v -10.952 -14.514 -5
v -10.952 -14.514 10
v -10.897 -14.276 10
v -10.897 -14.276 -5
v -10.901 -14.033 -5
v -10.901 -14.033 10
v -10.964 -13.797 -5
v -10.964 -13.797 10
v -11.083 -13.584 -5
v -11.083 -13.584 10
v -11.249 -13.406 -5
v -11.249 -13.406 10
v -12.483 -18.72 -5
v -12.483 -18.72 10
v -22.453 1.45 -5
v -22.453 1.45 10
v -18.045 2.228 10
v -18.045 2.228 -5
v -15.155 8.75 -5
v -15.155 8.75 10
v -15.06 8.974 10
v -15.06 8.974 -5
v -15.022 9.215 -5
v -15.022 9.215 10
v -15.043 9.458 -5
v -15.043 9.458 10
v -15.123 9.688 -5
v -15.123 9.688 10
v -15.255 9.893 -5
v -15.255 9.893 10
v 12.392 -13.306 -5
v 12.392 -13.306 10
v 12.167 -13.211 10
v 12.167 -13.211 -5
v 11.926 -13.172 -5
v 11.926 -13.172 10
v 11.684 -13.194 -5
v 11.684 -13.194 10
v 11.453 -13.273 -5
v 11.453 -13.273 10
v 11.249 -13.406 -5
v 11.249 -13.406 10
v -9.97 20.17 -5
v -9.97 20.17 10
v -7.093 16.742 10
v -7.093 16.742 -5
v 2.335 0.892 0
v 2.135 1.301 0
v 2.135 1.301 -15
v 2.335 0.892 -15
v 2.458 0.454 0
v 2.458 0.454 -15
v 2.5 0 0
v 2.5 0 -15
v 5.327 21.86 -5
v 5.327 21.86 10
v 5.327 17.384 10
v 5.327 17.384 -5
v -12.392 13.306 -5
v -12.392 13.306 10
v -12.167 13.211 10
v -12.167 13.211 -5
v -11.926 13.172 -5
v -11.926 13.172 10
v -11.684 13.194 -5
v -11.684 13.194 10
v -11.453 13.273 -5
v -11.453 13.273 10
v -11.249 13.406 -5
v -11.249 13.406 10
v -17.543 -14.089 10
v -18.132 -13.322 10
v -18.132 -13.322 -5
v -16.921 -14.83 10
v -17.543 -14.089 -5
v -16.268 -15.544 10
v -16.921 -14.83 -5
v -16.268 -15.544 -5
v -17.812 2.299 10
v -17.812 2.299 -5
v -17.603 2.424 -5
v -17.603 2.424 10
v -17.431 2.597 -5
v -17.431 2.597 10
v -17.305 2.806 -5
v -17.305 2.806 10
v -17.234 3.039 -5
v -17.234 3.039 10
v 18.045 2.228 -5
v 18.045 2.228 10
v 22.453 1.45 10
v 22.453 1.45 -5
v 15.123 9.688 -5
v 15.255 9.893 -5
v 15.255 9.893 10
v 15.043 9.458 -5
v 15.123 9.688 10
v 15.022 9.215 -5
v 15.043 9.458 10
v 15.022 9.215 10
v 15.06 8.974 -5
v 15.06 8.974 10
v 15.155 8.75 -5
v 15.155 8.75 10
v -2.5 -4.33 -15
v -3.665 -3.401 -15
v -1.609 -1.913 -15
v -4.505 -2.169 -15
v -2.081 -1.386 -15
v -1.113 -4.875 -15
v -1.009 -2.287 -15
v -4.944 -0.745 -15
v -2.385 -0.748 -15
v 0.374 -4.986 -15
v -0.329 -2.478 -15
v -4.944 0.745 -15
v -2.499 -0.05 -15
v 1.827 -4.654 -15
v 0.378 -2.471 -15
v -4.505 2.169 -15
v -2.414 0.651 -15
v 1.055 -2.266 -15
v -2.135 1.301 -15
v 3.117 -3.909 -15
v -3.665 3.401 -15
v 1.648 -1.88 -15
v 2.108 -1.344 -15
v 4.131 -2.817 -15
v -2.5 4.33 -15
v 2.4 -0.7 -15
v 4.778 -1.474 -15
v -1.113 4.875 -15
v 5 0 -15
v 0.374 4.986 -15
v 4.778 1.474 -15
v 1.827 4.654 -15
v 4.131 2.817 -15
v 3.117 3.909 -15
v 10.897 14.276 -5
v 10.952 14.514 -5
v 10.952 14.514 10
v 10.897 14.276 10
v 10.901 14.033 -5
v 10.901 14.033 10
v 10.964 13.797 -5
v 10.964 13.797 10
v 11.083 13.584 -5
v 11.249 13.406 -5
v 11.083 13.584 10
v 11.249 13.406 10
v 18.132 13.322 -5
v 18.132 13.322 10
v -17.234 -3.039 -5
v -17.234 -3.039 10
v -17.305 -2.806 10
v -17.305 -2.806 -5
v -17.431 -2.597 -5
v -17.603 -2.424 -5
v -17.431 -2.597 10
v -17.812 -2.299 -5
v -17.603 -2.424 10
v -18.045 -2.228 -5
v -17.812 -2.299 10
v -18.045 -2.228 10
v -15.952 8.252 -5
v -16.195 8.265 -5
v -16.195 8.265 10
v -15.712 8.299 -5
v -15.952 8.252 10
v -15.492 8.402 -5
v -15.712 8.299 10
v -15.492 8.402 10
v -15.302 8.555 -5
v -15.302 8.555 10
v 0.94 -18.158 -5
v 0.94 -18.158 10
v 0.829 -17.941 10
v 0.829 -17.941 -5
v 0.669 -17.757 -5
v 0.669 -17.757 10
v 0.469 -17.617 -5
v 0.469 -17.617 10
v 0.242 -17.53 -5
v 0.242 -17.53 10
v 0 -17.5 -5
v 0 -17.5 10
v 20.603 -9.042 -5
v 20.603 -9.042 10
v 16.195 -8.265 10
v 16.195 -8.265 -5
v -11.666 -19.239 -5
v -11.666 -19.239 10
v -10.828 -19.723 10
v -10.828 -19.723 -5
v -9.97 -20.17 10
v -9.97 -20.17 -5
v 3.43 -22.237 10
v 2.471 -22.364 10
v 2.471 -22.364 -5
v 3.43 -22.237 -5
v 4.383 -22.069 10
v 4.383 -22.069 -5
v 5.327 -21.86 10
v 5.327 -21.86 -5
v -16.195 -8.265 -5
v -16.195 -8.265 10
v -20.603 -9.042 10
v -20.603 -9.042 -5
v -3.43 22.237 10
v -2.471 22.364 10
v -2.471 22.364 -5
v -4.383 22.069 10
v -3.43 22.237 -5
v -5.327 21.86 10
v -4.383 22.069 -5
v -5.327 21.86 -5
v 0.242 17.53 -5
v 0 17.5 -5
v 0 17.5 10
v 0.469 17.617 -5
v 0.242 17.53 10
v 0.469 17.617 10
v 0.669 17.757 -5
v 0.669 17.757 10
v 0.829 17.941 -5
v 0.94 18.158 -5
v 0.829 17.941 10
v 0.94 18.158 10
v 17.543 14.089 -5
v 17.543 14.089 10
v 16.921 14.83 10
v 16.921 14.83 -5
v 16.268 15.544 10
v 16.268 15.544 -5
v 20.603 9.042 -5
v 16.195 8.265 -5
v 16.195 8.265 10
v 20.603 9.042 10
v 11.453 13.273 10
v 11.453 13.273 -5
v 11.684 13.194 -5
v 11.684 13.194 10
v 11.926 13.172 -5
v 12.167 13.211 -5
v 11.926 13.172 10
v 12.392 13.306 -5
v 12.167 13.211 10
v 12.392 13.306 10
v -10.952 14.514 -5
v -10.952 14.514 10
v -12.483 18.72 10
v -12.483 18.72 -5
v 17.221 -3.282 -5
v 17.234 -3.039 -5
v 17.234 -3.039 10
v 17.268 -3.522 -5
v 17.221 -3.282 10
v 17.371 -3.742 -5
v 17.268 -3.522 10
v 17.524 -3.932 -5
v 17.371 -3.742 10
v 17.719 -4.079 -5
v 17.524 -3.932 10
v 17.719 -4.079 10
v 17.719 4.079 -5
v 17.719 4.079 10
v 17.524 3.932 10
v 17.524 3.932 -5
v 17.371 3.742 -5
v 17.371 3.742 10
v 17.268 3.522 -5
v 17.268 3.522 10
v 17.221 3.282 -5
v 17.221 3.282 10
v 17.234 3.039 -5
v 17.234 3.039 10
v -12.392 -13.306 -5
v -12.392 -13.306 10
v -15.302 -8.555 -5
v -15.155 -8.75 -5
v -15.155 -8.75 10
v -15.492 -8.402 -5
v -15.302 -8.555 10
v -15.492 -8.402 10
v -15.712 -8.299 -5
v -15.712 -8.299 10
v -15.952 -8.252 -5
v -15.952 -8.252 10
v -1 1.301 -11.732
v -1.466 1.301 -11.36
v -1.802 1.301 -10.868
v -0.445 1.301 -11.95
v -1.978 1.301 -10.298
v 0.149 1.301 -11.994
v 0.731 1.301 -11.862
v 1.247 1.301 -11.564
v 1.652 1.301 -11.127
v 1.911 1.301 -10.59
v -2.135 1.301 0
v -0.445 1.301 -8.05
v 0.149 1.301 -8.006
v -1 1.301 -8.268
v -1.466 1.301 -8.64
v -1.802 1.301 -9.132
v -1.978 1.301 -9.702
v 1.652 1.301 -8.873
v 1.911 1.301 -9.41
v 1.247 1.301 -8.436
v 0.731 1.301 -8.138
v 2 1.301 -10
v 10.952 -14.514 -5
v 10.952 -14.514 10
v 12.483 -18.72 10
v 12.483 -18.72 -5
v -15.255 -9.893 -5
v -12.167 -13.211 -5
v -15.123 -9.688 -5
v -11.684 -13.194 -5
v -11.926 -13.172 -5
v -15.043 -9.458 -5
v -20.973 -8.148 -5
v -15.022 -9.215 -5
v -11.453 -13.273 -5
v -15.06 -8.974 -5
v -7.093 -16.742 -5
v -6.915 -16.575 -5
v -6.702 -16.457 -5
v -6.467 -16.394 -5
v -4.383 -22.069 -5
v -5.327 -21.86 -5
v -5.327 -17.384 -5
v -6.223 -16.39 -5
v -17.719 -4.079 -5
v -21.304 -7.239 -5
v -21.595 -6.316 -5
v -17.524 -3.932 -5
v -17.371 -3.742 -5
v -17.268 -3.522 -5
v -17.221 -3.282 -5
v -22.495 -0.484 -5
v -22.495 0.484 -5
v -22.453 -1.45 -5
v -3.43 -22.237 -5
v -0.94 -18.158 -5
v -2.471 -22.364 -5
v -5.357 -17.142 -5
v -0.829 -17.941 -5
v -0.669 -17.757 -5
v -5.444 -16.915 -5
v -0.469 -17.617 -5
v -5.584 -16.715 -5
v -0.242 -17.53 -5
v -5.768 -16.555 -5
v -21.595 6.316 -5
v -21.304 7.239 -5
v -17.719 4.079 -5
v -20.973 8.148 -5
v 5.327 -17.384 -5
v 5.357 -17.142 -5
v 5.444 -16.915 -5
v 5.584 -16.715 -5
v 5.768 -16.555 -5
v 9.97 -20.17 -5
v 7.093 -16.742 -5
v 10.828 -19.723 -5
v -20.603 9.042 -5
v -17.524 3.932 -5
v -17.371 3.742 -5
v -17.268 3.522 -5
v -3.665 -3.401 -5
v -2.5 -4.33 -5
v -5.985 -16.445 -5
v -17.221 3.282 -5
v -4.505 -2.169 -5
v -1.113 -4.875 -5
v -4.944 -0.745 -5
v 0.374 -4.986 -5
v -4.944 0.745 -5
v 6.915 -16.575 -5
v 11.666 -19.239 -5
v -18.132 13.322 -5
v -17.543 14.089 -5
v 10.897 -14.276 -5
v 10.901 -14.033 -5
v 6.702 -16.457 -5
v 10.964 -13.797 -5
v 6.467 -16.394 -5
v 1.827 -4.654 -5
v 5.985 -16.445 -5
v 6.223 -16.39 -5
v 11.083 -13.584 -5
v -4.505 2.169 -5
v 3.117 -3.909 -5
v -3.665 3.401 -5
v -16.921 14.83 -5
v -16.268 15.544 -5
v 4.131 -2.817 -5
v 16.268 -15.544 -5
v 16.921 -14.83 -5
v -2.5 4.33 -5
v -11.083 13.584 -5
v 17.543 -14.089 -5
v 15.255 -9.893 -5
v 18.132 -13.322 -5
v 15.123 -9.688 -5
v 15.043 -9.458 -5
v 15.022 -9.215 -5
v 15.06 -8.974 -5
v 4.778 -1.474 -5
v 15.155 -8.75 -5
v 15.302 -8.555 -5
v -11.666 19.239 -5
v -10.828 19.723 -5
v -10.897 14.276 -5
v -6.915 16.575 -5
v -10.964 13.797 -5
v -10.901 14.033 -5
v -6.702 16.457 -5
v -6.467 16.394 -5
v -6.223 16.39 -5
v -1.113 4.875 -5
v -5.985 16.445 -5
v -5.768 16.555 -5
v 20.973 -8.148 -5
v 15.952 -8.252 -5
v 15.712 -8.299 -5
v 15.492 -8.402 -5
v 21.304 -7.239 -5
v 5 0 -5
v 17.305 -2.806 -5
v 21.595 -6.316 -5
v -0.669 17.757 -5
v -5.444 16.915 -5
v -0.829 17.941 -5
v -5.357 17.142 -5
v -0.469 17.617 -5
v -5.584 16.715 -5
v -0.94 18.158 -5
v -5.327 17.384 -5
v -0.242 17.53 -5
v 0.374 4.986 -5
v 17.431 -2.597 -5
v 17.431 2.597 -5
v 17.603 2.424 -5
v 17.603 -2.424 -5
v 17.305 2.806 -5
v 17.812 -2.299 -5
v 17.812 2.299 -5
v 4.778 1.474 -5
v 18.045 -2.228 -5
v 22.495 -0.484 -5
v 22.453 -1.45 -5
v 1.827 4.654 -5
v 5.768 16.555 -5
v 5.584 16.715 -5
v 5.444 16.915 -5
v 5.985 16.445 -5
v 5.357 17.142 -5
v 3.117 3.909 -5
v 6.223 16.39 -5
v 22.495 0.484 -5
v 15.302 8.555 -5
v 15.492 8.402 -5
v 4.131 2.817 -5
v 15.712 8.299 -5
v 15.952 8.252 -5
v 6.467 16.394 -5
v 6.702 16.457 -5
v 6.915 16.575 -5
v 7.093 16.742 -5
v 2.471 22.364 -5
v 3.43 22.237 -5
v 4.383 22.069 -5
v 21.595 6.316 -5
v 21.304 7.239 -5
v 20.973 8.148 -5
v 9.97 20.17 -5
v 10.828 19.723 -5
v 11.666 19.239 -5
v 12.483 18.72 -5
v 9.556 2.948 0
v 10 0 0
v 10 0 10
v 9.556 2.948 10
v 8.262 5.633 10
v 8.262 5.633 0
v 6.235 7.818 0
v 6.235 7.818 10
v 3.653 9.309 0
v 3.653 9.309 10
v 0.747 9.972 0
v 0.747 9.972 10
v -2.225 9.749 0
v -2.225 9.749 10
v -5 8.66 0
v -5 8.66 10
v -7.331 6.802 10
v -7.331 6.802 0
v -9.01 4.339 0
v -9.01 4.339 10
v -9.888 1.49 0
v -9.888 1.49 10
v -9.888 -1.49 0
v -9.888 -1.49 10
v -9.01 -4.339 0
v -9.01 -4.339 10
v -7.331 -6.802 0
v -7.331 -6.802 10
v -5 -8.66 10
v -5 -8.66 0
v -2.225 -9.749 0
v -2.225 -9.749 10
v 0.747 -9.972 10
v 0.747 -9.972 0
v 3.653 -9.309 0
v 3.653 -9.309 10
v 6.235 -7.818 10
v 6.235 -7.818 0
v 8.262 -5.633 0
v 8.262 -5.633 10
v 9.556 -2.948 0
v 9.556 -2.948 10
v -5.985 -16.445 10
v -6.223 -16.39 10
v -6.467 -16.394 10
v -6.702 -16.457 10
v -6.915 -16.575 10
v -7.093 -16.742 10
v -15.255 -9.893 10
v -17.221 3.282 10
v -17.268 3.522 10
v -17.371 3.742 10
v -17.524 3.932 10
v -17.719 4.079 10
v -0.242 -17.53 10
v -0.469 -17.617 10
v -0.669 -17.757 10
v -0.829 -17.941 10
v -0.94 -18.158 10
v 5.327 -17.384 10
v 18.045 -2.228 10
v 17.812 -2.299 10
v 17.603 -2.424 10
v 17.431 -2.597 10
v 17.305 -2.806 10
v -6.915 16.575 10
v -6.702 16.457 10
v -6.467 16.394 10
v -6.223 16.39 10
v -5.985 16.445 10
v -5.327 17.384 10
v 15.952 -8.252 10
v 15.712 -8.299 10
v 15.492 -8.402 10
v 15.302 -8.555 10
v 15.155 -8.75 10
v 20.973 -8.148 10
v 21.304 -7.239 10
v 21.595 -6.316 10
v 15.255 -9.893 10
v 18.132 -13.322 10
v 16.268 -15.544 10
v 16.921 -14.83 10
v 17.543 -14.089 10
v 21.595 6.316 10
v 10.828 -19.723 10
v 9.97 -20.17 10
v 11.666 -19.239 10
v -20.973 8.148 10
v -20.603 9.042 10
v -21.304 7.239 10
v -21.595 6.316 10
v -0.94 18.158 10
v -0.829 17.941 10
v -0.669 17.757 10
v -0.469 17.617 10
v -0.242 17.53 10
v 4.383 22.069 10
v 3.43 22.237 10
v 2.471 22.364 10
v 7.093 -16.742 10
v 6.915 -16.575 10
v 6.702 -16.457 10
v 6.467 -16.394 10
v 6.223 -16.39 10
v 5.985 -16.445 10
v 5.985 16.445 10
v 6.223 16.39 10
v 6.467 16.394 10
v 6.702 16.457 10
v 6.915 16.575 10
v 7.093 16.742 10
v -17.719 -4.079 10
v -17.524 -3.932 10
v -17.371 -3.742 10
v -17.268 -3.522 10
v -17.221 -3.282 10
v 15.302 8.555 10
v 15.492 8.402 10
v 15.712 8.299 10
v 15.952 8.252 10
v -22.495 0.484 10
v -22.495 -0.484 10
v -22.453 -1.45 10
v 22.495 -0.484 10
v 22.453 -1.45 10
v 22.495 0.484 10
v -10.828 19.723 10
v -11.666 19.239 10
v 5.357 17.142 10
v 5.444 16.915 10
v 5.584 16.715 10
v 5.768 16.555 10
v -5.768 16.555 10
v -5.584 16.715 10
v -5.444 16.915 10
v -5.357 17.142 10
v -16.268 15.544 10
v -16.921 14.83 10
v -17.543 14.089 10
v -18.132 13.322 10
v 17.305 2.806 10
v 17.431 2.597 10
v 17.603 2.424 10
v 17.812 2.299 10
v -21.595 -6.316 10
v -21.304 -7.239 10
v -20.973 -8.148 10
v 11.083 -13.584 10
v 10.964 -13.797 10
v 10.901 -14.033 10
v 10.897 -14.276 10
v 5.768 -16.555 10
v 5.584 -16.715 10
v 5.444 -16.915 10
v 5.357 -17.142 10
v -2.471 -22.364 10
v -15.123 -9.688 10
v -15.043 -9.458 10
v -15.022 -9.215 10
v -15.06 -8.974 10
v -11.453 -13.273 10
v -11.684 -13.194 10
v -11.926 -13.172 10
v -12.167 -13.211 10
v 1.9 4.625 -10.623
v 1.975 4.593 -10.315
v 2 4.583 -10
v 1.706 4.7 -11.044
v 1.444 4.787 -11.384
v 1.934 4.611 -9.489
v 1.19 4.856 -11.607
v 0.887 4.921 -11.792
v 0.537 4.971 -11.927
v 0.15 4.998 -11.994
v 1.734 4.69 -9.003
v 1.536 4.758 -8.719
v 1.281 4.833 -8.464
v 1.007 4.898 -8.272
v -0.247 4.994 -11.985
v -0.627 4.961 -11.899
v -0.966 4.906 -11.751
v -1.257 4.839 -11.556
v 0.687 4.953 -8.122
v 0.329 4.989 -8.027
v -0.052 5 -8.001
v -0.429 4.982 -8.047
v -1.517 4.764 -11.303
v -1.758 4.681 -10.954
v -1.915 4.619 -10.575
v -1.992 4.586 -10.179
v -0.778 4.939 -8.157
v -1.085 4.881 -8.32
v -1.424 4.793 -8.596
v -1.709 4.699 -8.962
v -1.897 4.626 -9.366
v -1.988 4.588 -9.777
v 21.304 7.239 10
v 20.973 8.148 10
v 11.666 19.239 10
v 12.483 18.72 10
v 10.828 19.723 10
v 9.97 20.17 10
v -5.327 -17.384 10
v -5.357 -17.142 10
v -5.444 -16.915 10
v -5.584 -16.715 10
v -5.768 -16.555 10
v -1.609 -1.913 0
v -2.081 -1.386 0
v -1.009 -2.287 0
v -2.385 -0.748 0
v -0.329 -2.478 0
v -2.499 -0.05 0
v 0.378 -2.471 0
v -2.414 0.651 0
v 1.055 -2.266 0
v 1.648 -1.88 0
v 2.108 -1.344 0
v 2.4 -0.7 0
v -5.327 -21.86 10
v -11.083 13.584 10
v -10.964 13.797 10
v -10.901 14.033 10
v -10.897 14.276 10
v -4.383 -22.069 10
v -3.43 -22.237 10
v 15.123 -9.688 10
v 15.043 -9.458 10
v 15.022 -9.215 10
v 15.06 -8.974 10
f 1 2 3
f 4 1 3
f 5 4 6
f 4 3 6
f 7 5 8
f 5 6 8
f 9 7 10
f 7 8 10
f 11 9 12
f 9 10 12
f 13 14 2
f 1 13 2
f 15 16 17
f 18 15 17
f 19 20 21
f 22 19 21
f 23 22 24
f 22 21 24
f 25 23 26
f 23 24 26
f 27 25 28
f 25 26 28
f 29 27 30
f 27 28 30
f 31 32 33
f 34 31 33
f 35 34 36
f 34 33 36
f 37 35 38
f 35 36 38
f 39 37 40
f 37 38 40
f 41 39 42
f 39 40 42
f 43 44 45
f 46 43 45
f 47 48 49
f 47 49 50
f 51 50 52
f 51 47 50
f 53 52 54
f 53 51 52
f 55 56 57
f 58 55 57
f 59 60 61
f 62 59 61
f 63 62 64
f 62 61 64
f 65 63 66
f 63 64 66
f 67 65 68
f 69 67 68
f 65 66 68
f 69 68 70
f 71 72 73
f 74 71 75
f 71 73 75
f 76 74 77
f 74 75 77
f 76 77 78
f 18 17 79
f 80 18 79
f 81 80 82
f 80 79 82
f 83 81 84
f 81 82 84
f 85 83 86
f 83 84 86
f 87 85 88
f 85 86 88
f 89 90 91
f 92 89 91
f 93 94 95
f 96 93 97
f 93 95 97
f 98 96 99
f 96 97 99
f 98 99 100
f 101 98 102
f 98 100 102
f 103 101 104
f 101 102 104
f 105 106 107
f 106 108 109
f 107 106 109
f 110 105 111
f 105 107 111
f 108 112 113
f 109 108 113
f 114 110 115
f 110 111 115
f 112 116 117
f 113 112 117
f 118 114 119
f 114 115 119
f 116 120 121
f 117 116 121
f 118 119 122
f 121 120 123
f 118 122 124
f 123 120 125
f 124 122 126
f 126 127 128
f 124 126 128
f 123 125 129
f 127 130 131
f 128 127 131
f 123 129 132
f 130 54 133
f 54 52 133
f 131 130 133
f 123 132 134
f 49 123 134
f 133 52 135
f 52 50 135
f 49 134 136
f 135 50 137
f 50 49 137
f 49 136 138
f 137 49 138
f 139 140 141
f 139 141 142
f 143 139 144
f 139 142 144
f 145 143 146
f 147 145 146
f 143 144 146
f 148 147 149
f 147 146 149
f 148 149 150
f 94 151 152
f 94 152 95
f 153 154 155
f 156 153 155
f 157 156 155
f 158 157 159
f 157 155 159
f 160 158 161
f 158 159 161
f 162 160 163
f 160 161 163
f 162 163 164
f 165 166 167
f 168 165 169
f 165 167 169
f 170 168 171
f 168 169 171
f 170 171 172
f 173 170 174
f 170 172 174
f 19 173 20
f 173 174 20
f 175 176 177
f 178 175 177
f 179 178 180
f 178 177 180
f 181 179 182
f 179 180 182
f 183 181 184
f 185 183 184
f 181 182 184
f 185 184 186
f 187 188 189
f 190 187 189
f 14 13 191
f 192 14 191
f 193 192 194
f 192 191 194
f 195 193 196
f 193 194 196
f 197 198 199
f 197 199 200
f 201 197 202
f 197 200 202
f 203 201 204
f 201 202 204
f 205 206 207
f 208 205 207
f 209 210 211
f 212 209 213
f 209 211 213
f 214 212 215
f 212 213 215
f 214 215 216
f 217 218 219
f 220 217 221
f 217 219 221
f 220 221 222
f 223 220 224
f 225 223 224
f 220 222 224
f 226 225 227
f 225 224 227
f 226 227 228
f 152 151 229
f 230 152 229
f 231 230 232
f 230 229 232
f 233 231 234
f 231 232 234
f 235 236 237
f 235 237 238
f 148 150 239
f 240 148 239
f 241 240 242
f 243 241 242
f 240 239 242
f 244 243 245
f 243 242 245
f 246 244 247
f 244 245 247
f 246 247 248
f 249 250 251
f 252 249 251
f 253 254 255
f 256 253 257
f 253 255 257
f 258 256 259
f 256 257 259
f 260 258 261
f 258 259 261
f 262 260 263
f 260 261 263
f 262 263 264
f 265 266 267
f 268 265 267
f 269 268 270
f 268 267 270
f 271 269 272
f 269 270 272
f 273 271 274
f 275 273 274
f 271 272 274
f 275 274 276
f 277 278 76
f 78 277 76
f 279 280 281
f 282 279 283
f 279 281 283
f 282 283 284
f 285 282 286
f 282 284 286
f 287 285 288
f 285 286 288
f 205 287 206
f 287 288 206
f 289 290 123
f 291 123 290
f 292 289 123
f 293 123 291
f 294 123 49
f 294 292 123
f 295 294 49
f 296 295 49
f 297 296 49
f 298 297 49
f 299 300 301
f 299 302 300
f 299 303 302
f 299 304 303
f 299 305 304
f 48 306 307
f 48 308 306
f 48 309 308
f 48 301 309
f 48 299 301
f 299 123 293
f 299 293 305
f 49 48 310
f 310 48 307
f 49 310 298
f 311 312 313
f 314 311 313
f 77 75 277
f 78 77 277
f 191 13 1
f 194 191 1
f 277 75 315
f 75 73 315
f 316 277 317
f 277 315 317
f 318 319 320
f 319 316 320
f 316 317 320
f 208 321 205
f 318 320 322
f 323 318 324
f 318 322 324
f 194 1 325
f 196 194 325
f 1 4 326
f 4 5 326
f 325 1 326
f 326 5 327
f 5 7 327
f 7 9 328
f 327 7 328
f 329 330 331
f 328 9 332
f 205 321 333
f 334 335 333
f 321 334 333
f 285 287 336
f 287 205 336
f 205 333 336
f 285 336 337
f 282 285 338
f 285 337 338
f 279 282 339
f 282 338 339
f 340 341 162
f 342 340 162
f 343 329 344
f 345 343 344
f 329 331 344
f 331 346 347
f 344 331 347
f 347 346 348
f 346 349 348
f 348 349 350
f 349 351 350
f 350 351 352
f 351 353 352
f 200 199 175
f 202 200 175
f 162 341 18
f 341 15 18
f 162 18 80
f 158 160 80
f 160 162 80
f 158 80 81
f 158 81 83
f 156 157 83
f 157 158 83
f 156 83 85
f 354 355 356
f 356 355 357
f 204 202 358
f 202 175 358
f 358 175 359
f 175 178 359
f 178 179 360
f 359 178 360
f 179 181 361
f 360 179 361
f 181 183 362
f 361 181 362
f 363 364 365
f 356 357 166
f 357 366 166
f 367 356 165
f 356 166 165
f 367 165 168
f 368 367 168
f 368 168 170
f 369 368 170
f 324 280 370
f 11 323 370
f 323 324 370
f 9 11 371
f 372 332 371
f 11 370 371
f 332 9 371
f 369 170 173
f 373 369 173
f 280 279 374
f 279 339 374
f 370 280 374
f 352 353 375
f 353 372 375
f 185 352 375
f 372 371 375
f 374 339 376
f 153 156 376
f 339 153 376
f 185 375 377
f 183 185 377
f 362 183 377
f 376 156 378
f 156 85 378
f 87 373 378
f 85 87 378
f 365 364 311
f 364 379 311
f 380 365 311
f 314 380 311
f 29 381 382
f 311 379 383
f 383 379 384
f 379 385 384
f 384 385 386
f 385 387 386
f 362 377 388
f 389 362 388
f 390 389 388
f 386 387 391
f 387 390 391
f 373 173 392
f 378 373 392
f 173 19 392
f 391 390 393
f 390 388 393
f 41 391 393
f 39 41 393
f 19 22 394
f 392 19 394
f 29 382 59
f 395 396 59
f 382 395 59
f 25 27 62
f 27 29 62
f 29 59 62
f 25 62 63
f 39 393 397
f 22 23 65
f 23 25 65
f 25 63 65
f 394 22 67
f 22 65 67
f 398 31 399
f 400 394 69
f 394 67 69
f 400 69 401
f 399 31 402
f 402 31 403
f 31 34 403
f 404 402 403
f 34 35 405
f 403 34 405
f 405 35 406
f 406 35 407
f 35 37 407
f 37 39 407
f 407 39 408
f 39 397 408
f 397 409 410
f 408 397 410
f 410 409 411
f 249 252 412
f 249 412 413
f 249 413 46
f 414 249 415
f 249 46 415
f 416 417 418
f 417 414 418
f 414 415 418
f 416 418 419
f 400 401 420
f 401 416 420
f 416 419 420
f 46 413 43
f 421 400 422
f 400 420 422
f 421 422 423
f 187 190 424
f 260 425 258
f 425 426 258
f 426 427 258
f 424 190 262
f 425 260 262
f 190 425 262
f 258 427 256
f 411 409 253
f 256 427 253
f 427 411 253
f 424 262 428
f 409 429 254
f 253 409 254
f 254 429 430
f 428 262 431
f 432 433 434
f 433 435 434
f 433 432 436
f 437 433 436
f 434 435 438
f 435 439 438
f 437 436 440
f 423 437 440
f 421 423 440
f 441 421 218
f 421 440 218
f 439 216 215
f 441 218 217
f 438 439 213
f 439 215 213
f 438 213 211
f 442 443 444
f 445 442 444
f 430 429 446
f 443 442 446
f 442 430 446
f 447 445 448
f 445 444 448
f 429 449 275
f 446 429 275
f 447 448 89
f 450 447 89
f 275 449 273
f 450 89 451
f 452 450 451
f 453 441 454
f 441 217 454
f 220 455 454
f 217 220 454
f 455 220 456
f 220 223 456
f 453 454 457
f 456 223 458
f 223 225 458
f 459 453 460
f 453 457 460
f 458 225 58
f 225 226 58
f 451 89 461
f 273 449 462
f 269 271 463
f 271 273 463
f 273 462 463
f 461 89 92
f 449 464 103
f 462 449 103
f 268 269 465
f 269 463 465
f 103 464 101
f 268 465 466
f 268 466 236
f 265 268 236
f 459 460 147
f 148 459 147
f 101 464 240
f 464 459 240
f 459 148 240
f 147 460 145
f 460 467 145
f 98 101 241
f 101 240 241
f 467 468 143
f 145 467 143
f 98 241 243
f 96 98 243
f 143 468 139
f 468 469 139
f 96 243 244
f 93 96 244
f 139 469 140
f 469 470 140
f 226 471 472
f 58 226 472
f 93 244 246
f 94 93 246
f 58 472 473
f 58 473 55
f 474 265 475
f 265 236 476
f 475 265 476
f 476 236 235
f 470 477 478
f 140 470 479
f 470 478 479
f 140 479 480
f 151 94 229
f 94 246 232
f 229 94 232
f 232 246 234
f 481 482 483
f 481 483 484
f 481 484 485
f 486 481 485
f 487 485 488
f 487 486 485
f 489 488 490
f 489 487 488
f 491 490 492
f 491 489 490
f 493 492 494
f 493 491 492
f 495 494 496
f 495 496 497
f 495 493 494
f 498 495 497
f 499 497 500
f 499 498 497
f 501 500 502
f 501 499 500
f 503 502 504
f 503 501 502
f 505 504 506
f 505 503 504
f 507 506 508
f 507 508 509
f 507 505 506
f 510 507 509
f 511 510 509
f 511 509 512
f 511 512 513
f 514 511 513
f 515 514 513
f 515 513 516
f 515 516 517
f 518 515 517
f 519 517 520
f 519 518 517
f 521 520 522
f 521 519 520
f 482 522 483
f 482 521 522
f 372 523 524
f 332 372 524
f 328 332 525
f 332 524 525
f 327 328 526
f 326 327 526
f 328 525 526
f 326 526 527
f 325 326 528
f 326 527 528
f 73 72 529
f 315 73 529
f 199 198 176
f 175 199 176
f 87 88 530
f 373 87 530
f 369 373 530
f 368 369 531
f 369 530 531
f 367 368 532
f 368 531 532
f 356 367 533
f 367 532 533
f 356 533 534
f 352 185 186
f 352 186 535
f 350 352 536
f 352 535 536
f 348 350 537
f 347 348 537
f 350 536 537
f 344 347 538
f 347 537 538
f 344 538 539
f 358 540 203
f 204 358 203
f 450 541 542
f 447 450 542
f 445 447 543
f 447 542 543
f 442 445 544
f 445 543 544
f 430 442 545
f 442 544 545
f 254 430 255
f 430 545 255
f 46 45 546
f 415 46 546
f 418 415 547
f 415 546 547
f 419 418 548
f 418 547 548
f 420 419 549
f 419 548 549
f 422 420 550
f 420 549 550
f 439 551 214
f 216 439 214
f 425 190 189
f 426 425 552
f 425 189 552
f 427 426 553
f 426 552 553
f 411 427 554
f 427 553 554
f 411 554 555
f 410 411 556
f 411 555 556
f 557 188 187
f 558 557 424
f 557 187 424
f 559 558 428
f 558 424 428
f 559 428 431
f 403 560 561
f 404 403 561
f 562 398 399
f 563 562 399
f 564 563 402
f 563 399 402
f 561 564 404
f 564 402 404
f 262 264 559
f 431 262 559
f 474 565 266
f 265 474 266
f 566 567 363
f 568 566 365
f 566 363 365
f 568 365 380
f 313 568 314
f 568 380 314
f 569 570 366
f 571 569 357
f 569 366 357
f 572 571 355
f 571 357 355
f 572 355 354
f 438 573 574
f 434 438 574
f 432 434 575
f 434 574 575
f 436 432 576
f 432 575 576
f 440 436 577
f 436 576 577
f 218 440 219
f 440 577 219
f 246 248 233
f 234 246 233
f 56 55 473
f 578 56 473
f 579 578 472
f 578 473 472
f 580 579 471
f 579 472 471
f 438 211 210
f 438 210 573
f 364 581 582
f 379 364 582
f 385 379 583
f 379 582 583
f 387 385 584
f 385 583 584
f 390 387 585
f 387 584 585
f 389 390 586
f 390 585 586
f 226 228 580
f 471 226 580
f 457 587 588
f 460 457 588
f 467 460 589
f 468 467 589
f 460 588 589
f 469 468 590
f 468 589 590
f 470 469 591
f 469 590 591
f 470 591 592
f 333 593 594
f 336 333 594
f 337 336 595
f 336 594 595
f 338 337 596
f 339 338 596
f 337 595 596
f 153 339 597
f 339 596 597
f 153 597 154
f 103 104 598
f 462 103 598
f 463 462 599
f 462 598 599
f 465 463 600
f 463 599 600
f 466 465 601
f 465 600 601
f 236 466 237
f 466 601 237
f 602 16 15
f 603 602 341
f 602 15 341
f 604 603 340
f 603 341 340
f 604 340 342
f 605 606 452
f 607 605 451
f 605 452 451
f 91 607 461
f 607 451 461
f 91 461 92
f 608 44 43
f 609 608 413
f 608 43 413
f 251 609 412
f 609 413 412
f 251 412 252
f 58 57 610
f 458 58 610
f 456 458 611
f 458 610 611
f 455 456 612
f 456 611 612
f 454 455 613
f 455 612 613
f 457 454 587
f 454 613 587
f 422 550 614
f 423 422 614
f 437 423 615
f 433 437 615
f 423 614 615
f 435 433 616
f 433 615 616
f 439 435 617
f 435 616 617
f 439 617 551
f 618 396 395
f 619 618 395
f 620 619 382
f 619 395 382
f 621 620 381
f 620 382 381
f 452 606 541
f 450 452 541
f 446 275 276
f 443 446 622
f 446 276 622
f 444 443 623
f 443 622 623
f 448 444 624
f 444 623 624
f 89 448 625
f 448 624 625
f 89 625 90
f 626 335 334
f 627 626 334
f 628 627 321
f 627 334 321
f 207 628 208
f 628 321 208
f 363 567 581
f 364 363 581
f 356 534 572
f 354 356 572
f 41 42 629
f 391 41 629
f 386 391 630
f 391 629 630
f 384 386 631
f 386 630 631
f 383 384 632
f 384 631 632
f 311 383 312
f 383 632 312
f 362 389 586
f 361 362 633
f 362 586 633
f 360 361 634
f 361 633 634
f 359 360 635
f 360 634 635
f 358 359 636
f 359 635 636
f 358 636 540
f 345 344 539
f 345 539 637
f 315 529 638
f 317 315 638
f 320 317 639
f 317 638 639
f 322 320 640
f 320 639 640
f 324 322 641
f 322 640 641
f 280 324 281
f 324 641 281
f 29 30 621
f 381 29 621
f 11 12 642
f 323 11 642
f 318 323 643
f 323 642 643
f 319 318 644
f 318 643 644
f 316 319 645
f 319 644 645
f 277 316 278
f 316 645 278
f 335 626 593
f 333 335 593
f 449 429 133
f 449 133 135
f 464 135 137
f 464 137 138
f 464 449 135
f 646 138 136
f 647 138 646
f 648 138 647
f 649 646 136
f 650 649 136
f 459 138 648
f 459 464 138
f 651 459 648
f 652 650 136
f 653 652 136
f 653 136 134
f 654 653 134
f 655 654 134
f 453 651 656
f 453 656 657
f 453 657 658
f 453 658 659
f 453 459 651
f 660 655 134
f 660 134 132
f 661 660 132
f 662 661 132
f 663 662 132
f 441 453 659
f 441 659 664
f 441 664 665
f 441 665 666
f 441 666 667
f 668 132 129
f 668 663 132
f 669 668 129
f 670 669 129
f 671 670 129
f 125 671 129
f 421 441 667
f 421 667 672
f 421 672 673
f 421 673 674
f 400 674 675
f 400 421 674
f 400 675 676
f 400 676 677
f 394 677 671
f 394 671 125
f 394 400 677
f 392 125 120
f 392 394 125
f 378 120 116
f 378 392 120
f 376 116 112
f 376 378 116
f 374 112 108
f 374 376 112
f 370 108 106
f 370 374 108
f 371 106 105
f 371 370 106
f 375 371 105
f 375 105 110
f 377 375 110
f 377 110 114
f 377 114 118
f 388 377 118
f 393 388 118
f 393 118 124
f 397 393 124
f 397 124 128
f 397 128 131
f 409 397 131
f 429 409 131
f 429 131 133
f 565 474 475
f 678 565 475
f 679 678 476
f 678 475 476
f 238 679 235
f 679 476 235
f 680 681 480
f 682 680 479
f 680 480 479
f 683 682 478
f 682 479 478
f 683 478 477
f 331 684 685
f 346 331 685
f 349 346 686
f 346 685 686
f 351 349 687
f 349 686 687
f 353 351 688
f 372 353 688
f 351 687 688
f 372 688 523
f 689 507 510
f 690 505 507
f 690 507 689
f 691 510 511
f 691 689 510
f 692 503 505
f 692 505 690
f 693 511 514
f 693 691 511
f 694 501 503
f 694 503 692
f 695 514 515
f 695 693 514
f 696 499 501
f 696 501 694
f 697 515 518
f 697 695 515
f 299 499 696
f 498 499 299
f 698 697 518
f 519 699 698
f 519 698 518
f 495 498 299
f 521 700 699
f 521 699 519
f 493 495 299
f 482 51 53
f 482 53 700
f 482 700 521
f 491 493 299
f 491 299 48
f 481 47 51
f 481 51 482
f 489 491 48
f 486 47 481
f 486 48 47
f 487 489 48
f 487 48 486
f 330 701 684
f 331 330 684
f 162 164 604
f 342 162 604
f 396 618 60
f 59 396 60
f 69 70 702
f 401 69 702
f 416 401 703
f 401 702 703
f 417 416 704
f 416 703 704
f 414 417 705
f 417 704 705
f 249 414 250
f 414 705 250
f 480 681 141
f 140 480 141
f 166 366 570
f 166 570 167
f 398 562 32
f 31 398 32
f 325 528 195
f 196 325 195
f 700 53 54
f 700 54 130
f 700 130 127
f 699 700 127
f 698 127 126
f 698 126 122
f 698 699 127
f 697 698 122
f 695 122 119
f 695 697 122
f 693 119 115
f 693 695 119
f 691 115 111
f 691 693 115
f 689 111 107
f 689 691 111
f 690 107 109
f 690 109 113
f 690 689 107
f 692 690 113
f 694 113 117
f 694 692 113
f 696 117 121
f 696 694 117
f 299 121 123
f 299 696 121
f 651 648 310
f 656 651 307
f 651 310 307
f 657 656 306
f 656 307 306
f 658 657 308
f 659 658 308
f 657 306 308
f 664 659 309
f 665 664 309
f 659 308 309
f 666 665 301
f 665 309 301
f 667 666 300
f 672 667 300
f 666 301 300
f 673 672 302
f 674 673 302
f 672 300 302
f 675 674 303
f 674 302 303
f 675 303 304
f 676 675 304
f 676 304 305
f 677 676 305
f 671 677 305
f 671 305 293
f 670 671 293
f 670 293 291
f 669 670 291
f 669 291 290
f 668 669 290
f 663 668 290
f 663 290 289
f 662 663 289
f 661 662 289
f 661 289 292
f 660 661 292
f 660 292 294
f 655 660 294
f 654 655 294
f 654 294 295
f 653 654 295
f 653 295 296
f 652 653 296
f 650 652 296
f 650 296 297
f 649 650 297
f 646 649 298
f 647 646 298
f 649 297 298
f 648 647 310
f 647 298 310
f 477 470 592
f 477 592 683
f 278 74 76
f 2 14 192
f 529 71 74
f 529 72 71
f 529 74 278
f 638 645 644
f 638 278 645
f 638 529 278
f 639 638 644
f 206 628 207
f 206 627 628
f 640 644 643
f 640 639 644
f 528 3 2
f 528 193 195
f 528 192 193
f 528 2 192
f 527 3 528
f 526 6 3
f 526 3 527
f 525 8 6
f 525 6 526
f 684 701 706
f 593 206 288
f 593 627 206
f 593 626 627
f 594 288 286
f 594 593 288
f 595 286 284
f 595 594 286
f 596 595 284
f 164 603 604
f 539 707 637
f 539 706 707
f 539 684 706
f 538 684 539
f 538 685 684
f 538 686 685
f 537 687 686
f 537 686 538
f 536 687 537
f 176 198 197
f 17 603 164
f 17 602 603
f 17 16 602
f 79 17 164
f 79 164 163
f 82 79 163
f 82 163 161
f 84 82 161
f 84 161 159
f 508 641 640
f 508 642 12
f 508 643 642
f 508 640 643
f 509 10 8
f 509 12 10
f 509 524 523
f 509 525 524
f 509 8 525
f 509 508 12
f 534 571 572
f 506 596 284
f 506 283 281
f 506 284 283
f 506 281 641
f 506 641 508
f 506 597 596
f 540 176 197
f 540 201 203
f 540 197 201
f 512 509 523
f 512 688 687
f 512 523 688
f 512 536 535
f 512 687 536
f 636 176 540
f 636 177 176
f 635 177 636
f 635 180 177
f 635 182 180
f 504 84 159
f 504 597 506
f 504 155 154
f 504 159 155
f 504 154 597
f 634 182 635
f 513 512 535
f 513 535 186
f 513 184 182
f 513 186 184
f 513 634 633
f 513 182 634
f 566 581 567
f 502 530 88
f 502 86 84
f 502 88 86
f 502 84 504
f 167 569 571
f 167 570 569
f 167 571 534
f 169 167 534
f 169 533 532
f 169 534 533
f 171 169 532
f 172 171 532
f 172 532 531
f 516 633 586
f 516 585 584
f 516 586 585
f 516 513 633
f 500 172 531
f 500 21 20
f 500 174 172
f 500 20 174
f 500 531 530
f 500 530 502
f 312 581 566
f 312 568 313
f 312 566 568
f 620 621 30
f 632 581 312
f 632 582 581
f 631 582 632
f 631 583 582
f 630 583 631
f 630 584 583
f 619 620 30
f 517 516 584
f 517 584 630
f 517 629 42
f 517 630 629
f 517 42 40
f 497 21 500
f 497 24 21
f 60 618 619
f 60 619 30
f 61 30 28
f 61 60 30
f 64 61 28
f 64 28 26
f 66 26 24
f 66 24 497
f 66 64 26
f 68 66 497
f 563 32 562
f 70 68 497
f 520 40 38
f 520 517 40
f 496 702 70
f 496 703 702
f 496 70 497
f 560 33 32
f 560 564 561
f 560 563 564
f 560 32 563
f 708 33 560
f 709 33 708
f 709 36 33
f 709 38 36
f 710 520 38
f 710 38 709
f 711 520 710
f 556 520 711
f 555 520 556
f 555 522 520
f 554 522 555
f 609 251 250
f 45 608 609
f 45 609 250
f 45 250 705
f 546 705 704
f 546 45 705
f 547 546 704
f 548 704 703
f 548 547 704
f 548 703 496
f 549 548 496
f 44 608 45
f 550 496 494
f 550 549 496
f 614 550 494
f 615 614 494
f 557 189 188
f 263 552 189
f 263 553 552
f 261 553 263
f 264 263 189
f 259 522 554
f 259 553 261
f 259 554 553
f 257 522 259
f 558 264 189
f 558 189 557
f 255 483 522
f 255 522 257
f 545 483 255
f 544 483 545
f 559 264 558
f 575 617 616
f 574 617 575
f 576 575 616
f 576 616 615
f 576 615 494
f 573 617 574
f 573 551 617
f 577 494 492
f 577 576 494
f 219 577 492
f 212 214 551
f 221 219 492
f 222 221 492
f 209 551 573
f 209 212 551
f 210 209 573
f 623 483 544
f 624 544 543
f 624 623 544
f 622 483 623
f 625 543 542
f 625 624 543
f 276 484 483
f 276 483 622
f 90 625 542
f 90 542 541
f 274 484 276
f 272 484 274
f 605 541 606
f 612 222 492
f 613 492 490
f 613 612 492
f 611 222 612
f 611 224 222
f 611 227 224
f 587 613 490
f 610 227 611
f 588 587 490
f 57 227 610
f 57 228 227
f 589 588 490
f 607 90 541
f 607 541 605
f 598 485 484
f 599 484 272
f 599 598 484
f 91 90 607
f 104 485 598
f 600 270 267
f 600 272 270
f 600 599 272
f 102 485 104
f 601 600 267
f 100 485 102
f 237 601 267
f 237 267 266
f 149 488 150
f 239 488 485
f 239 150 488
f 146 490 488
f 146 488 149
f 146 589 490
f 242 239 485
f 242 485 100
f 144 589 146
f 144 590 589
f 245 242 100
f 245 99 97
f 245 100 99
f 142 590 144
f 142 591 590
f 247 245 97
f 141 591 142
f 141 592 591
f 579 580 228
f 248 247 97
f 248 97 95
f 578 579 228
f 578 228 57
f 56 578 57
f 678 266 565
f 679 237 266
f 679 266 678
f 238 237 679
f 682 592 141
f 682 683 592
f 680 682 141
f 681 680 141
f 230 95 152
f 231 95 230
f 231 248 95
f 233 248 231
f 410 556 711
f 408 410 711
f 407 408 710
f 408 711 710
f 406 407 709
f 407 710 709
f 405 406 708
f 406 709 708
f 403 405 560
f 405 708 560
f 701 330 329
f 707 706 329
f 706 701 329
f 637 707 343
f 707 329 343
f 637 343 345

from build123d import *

# Parameters (mm, degrees)
F0_R            = 10
F0_R_2          = 5
F1_DEPTH        = 5
F2_DEPTH        = 15
F3_R            = 2
F4_DEPTH        = 8.6998377653
F0_R_3          = 22.5
F0_R_4          = 17.5
F5_DEPTH        = 5
F6_DEPTH        = 10
F8_DEPTH        = 25.0010001
F8_COPIES_COUNT = 18


# Not quite as in the source:
# - a feature of the source that left no trace in its solid (it failed there, or was rolled back) is left out
# - a pattern or mirror of a feature is missing from the dataset's text; its kind, count and spacing are read off the source's solid


with BuildPart() as f1:
    # F0 (on Top) → F1 (new body)
    with BuildSketch(Plane.XY):
        Circle(F0_R)
        Circle(F0_R_2, mode=Mode.SUBTRACT)
    extrude(amount=-F1_DEPTH)

    # F0 (on Top) → F2 (join)
    with BuildSketch(Plane.XY):
        Circle(F0_R_2)
        with BuildLine():
            ThreePointArc((2.1347076706, 1.3011622347), (2.4069450738, 0.6757332401), (2.5, 0))
            ThreePointArc((2.5, 0), (-0.6757332401, -2.4069450738), (-2.1347076706, 1.3011622347))
            ThreePointArc((-2.1347076706, 1.3011622347), (0, 2.5), (2.1347076706, 1.3011622347))
        make_face(mode=Mode.SUBTRACT)
        with BuildLine():
            Line((-2.1347076706, 1.3011622347), (2.1347076706, 1.3011622347))
            ThreePointArc((2.1347076706, 1.3011622347), (0, 2.5), (-2.1347076706, 1.3011622347))
        make_face()
    extrude(amount=-F2_DEPTH)

    # F3 (on face) → F4 (cut, through all)
    with BuildSketch(Plane.XZ.offset(-1.3011622347)):
        with Locations((0, -10)):
            Circle(F3_R)
    extrude(amount=-F4_DEPTH, mode=Mode.SUBTRACT)

    # F0 (on Top) → F5 (join)
    with BuildSketch(Plane.XY):
        Circle(F0_R_3)
        Circle(F0_R_4, mode=Mode.SUBTRACT)
        Circle(F0_R_4)
        Circle(F0_R, mode=Mode.SUBTRACT)
    extrude(amount=-F5_DEPTH)

    # F0 (on Top) → F6 (join)
    with BuildSketch(Plane.XY):
        Circle(F0_R_3)
        Circle(F0_R_4, mode=Mode.SUBTRACT)
        Circle(F0_R_4)
        Circle(F0_R, mode=Mode.SUBTRACT)
    extrude(amount=F6_DEPTH)

    # F7 (on face) → F8 (cut, through all)
    with BuildSketch(Plane.XY.offset(10)):
        with BuildLine():
            Line((0.9396926208, 18.1579798567), (2.470541887, 22.3639536483))
            ThreePointArc((2.470541887, 22.3639536483), (0, 22.5), (-2.470541887, 22.3639536483))
            Line((-2.470541887, 22.3639536483), (-0.9396926208, 18.1579798567))
            ThreePointArc((-0.9396926208, 18.1579798567), (-0.5735764364, 17.6808479557), (0, 17.5))
            ThreePointArc((0, 17.5), (0.5735764364, 17.6808479557), (0.9396926208, 18.1579798567))
        make_face()
    f8 = extrude(amount=-F8_DEPTH, mode=Mode.SUBTRACT)

    # F8_copies: F8 ×18 about axis
    f8_copies_axis = Axis((0, 0, 0), (0, 0, 1))
    for i in range(1, F8_COPIES_COUNT):
        add(f8.rotate(f8_copies_axis, i * 360 / F8_COPIES_COUNT), mode=Mode.SUBTRACT)


solid = f1.part
